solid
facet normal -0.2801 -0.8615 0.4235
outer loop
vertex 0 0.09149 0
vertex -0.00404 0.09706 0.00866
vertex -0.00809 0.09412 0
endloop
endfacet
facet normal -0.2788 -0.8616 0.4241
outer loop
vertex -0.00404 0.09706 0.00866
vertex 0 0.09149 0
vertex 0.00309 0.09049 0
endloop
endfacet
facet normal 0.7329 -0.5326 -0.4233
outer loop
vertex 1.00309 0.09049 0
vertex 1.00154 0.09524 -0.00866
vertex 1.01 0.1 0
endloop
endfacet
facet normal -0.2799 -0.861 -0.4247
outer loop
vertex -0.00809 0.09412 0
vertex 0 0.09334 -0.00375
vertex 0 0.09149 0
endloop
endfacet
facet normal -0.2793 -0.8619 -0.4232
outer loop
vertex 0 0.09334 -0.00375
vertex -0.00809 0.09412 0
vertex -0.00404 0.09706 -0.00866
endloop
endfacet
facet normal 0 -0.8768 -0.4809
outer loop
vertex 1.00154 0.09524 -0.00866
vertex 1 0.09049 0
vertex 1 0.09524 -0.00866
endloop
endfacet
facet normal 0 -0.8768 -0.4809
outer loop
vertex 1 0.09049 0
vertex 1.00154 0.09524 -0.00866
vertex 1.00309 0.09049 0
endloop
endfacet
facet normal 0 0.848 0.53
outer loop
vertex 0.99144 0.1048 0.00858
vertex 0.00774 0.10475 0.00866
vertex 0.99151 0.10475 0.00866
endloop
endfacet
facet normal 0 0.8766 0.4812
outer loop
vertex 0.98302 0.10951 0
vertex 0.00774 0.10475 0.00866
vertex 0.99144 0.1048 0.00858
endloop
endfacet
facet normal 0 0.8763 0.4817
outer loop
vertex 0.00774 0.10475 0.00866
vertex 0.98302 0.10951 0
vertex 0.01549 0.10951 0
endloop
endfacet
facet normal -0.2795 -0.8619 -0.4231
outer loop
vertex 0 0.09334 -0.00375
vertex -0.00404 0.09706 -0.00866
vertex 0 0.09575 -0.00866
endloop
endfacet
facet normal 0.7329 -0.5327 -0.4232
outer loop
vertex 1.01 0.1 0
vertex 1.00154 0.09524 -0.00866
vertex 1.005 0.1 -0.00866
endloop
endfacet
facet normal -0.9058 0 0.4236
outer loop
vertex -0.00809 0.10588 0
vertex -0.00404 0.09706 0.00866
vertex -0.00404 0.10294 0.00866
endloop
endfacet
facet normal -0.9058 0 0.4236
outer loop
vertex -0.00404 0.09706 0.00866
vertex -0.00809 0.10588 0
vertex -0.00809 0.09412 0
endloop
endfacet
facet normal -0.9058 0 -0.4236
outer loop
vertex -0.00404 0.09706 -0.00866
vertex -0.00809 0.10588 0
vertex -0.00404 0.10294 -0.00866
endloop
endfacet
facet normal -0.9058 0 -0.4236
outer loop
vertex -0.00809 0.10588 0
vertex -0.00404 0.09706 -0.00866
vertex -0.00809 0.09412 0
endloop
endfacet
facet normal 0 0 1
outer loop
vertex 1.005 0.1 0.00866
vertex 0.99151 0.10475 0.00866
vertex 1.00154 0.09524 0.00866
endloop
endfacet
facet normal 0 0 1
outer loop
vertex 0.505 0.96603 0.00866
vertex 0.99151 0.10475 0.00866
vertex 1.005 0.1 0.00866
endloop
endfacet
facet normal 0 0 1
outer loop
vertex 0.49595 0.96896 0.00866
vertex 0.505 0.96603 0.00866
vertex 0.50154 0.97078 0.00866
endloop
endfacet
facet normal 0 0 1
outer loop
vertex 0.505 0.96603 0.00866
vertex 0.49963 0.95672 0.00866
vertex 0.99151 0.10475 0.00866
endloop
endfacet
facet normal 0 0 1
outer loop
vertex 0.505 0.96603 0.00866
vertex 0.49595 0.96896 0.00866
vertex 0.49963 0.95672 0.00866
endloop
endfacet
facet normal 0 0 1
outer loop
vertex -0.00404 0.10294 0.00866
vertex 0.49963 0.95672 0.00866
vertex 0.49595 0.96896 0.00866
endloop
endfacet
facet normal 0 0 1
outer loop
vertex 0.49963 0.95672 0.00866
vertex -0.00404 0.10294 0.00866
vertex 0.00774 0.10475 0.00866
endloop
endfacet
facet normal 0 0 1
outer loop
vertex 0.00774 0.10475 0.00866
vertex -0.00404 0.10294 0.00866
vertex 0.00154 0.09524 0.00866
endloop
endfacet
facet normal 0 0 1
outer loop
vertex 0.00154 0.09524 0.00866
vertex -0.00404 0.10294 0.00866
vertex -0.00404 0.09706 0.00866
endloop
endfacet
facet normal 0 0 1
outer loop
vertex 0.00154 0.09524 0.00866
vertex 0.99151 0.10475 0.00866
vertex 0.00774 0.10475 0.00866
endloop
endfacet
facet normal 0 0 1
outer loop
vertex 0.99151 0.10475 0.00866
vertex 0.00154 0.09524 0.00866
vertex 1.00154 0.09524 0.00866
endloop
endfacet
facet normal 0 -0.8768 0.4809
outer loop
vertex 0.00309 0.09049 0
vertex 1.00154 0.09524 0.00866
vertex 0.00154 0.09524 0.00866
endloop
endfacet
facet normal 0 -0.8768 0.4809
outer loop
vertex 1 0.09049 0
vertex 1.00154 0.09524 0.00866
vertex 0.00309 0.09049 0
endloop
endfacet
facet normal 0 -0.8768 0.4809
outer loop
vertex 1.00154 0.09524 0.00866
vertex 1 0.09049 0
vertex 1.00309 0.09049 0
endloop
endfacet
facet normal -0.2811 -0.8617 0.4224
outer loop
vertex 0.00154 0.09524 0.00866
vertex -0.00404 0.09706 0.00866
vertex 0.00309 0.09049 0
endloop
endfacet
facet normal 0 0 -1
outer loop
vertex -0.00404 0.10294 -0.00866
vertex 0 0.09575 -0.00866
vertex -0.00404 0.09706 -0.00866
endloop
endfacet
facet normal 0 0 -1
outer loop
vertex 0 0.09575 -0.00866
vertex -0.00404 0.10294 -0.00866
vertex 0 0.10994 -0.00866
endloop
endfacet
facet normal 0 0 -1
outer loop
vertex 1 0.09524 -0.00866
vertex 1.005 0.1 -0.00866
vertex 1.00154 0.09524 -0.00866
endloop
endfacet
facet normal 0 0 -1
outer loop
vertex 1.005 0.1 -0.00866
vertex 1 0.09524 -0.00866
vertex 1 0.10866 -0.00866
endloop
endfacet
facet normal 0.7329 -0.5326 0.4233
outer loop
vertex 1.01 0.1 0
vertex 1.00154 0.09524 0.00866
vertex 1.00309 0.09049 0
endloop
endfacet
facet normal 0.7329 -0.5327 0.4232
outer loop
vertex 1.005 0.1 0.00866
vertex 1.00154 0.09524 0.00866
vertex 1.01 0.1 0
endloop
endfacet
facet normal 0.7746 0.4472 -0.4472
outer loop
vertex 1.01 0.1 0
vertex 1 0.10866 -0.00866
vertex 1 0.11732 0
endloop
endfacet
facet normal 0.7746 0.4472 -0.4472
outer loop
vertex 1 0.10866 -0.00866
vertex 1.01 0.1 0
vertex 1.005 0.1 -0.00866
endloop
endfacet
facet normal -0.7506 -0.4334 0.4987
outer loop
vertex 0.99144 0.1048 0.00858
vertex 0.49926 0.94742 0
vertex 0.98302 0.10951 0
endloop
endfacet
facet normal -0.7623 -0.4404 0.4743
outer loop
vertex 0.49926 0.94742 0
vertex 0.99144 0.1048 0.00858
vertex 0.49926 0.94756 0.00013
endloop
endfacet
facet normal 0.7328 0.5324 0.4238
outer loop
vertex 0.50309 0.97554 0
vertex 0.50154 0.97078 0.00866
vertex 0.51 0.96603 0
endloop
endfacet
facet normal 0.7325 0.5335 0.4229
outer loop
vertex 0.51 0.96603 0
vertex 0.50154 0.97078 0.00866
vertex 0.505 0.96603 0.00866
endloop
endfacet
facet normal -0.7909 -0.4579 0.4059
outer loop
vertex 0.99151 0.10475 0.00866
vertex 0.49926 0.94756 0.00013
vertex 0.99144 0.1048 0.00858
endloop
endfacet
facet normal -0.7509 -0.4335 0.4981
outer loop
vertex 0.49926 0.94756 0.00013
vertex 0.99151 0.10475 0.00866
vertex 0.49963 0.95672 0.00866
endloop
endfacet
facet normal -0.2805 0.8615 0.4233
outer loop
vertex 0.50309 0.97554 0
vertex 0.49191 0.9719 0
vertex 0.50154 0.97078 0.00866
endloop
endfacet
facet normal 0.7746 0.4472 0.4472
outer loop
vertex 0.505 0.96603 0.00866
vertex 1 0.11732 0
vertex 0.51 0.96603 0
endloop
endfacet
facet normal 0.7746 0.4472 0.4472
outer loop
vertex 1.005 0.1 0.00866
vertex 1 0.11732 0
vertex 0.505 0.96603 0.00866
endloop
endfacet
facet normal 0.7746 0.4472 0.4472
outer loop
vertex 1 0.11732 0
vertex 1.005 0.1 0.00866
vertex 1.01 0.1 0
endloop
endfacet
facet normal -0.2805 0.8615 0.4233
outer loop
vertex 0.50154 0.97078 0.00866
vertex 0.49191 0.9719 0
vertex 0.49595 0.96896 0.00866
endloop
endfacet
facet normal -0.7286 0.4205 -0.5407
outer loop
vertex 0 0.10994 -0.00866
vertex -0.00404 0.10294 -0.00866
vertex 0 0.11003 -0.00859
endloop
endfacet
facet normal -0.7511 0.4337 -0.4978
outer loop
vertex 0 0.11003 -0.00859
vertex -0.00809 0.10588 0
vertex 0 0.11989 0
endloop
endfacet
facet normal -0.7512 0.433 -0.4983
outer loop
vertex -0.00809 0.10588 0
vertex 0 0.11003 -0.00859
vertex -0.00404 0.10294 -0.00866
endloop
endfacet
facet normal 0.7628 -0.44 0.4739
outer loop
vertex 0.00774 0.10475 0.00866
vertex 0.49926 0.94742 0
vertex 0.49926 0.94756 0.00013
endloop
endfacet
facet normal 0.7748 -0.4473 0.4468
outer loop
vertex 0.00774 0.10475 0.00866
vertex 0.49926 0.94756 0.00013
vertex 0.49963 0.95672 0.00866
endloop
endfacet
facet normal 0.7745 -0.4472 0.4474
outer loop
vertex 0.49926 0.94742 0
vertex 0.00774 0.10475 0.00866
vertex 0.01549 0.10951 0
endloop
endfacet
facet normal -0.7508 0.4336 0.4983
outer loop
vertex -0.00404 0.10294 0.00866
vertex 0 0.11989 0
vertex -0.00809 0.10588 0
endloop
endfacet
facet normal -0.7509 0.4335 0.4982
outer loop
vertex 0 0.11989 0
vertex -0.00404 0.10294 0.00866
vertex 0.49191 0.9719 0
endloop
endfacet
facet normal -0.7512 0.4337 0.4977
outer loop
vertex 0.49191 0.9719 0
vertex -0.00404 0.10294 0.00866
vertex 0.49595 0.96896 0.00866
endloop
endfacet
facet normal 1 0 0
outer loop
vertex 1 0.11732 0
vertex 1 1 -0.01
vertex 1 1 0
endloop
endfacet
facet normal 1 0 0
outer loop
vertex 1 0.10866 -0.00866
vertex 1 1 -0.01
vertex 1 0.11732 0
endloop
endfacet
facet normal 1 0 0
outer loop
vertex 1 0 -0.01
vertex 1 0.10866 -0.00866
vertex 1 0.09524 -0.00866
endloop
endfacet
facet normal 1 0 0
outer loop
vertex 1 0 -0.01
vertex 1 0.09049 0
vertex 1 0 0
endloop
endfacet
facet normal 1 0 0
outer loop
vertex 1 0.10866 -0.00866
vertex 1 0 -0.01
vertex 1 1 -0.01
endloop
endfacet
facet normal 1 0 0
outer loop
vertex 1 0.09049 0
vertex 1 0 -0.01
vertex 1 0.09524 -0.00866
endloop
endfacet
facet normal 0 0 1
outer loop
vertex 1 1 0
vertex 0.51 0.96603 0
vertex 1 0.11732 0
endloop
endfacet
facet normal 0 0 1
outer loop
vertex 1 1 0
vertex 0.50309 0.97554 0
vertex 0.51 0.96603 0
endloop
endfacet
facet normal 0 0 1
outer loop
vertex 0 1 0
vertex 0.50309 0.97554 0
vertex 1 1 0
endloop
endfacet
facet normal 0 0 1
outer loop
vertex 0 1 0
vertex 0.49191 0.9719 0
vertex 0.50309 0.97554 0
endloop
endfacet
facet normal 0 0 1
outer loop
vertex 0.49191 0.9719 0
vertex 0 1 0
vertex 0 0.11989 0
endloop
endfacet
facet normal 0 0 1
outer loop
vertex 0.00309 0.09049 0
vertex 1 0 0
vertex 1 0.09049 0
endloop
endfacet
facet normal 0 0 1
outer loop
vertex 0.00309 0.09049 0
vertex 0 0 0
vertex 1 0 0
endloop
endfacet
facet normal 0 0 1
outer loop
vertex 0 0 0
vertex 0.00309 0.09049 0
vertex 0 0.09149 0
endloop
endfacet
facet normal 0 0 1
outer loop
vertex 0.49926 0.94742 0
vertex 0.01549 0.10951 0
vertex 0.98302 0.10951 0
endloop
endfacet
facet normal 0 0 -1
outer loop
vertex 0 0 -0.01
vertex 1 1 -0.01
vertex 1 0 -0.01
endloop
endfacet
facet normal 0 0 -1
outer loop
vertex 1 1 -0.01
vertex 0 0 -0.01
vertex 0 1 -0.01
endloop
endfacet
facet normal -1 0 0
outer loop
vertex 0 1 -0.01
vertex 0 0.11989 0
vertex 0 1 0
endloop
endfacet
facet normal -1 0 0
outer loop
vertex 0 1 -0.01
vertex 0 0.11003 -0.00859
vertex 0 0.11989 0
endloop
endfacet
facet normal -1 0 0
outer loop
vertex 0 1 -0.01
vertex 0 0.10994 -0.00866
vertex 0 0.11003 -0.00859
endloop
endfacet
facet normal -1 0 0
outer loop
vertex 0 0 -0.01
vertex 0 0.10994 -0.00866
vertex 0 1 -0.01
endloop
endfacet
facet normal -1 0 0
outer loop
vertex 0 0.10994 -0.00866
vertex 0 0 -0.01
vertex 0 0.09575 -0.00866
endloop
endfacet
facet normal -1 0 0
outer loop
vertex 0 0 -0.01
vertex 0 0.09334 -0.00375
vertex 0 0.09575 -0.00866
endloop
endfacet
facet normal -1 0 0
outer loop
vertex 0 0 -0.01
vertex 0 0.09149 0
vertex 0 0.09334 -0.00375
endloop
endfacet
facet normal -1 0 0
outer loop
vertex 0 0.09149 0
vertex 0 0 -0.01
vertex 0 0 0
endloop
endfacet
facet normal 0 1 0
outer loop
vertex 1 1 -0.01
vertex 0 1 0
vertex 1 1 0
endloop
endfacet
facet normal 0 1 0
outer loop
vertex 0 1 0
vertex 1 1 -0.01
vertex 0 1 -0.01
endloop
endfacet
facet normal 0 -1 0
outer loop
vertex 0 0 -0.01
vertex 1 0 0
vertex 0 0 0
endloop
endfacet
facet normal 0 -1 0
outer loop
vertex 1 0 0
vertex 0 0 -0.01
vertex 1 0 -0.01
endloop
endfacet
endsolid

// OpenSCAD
hull(){
    translate([0, 0.1]) sphere(0.01);
    translate([1, 0.1]) sphere(0.01);
}
hull(){
    translate([1, 0.1]) sphere(0.01);
    translate([0.5, 0.9660254037844386]) sphere(0.01);
}
hull(){
    translate([0.5, 0.9660254037844386]) sphere(0.01);
    translate([0, 0.1]) sphere(0.01);
}
translate([0,0,-0.01]) color([0.1,0.1,0.1]) cube([1,1,0.01]);
